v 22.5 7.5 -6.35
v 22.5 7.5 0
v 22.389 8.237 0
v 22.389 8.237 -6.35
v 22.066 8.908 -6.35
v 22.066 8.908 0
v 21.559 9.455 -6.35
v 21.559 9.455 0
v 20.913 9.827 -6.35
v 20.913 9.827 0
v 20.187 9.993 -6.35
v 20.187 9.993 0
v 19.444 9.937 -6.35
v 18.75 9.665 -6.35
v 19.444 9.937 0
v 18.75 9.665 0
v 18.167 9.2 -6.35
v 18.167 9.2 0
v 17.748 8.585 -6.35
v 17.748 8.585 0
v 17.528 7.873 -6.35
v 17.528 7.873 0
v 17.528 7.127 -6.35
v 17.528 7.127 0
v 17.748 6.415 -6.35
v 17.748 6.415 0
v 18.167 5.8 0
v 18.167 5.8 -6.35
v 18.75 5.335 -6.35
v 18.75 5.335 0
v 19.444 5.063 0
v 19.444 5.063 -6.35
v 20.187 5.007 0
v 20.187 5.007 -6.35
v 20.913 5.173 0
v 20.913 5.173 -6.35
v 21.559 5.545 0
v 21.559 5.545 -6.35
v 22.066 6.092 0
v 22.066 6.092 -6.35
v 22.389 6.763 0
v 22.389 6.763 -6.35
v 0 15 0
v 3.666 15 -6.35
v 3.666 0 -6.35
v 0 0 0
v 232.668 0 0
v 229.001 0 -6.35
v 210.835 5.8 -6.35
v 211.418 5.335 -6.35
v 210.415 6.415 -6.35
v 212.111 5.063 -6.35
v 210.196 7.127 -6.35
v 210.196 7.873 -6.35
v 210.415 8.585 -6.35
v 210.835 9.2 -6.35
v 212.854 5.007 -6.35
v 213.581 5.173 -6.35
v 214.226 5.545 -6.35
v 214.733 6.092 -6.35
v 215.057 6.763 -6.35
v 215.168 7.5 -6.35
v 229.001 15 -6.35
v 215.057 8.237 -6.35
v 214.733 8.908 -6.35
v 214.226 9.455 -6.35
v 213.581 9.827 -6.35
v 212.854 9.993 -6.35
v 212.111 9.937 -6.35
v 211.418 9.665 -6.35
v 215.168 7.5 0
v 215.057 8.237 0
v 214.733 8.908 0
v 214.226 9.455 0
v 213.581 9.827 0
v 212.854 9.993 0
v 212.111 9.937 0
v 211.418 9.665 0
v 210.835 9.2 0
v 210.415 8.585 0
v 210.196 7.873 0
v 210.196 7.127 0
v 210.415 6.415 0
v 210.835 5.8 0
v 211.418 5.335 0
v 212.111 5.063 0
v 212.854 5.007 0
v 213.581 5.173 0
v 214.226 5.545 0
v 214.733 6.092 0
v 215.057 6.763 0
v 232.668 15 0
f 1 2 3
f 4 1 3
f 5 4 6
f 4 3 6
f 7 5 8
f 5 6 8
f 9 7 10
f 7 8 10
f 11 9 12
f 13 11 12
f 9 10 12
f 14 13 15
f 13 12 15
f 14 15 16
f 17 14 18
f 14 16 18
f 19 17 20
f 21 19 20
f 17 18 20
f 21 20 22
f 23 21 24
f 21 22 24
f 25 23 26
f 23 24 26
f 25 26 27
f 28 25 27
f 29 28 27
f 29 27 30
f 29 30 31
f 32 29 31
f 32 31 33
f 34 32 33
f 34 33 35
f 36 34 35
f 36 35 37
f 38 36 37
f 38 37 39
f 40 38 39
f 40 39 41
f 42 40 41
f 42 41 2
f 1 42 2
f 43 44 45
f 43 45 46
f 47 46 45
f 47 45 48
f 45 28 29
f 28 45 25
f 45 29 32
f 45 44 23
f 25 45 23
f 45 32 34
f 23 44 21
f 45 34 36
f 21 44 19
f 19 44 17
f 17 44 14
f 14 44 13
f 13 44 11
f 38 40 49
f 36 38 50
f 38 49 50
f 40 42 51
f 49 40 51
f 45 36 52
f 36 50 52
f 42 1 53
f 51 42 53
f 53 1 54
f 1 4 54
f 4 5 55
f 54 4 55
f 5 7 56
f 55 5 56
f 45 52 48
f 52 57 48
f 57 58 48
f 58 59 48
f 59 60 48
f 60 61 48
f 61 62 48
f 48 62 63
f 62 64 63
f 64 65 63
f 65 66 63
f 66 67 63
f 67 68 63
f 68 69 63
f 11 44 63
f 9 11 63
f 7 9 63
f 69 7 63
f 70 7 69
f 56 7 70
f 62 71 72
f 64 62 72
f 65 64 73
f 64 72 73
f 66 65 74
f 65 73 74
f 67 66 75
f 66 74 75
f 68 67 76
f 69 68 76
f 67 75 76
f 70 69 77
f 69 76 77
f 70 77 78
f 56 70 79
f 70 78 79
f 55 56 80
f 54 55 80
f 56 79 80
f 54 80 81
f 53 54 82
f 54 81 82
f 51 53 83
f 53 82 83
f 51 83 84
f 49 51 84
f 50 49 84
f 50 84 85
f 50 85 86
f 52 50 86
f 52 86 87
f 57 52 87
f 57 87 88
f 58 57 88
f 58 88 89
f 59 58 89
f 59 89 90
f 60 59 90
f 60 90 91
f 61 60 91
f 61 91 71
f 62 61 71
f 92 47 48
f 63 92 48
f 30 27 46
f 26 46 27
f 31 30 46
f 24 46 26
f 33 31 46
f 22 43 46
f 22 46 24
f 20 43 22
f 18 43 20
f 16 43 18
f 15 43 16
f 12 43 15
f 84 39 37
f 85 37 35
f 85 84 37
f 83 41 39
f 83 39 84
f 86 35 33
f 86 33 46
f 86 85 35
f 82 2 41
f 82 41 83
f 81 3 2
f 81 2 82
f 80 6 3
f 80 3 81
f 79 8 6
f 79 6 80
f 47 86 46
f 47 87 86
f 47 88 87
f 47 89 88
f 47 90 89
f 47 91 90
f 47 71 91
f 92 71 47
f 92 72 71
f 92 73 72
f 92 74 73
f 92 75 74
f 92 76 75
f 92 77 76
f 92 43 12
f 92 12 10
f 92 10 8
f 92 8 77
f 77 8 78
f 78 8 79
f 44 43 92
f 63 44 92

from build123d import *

# Parameters (mm, degrees)
SKETCH1_W           = 232.6676516
SKETCH1_H           = 15
BOSS_EXTRUDE1_DEPTH = 6.35
CUT_EXTRUDE1_DEPTH  = 234.237129551
SKETCH3_R           = 2.5
CUT_EXTRUDE2_DEPTH  = 234.237129551


with BuildPart() as part:
    # Sketch1 → Boss-Extrude1 (new body)
    with BuildSketch(Plane.XY):
        with Locations((116.3338258, 7.5)):
            Rectangle(SKETCH1_W, SKETCH1_H)
    extrude(amount=-BOSS_EXTRUDE1_DEPTH)

    # Sketch2 → Cut-Extrude1 (cut, through all)
    with BuildSketch(Plane(origin=(0, 15, 0), x_dir=(1, 0, 0), z_dir=(0, 1, 0))):
        Polygon((0, 0), (0, 6.35), (3.666174209, 6.35), align=None)
        Polygon((232.6676516, 0), (229.001477391, 6.35), (232.6676516, 6.35), align=None)
    extrude(amount=-CUT_EXTRUDE1_DEPTH, mode=Mode.SUBTRACT)

    # Sketch3 → Cut-Extrude2 (cut, through all)
    with BuildSketch(Plane.XY):
        with Locations((20, 7.5)):
            Circle(SKETCH3_R)
        with Locations((212.6676516, 7.5)):
            Circle(SKETCH3_R)
    extrude(amount=-CUT_EXTRUDE2_DEPTH, mode=Mode.SUBTRACT)


solid = part.part
